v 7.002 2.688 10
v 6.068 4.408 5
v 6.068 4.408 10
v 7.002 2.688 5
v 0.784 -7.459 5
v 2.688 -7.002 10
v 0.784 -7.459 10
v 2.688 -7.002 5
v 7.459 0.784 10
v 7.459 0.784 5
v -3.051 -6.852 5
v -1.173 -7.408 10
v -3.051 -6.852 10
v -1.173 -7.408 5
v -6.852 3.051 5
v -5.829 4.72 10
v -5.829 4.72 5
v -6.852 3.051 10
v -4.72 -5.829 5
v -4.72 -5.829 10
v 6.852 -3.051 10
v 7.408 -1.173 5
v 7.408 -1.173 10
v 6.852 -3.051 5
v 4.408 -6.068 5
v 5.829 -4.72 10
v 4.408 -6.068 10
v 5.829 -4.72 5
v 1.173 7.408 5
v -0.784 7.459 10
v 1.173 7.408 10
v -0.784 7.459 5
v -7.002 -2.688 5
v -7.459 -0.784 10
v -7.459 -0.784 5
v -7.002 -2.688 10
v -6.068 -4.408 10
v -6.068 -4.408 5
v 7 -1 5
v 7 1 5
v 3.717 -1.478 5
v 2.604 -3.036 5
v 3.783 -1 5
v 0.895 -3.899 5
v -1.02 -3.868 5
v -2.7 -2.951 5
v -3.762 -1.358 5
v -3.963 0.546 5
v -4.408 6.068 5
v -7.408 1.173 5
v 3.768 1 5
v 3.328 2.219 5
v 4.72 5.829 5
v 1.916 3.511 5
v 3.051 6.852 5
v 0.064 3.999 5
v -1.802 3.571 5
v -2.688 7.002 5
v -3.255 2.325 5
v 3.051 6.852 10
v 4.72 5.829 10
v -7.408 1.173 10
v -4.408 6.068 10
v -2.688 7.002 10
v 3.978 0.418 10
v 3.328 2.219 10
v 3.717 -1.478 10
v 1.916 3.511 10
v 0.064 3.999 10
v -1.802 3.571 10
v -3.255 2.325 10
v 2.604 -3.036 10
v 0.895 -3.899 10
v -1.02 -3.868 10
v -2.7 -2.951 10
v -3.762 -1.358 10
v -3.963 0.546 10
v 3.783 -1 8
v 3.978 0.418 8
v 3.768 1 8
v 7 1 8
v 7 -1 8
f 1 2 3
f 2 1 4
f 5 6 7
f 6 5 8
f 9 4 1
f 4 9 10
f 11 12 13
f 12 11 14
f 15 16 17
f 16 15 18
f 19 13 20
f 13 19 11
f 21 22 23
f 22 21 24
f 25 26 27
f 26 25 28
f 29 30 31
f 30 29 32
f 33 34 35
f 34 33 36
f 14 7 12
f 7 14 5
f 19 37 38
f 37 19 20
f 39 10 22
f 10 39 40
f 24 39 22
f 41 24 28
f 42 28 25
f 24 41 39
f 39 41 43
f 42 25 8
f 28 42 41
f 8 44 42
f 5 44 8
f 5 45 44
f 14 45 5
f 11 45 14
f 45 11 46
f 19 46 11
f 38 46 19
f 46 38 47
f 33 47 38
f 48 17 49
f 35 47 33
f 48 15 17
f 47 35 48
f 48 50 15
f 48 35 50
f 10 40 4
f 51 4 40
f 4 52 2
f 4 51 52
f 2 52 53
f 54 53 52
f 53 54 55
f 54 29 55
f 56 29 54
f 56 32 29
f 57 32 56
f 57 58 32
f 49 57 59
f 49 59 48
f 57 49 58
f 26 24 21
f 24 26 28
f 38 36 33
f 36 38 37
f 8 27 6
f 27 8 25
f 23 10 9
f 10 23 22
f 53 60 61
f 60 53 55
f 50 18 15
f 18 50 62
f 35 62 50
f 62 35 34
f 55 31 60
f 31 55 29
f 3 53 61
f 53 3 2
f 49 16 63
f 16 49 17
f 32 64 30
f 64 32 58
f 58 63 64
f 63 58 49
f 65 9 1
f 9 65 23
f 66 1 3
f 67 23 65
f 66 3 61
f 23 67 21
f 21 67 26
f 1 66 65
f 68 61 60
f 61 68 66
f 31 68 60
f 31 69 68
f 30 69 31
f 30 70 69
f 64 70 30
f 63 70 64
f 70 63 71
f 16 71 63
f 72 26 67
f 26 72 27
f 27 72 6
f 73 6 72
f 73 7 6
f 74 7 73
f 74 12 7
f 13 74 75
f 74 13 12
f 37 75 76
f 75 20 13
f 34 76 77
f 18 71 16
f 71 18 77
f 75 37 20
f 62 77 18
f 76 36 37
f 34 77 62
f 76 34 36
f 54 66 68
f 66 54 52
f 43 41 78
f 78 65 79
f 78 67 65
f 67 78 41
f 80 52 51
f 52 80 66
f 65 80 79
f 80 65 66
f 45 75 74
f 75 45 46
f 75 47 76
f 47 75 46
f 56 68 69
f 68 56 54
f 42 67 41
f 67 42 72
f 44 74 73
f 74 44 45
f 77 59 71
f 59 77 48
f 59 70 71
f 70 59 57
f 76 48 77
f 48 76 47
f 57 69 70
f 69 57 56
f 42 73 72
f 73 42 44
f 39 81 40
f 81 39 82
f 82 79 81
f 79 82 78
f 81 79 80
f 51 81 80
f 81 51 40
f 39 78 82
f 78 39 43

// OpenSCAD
// file: ../robot_settings.scad
main_box_x = 95; // 96
main_box_y = 102;
main_box_z = 74; // 74.5
wall_thickness = 2;

rail_gap = 2;
rail_inset = 7;

rail_thickness = 7;
rail_length = 250;
rail_width = 200;

raspberry_pi_screw_seperation_y = 57;
raspberry_pi_screw_seperation_z = 48;
raspberry_pi_peg_h = 5;

battery_box_peg_h = 6;
battery_box_peg_d = 8;
battery_box_peg_cutout = 5;

gears_module = 1;
pinion_gear_teeth = 30;
pinion_gear_width = 5;
pinion_gear_bore = 4;

gears_setback_distance = 25;
gear_post_height = 2 * pinion_gear_width + rail_thickness + 8 ;

steering_motor_mount_x = 45;
steering_motor_mount_y = 36;
steering_motor_mount_z = 18;
steering_motor_mount_setback_distance = gears_setback_distance + 16;

dc_motor_drivertype = "Teyleten"; // Teyleten
isAdafruit = (dc_motor_drivertype == "Adafruit");

drv8871_x = isAdafruit ? 20.3 : 21.6;
drv8871_y = isAdafruit ?  24 : 25;

drv8871_z = 2;
drv8871_screw_d = 2.5;
drv8871_solder_points_z = 2;

drv8871mount_edge_x = 1.5;
drv8871mount_edge_wall = 3;
drv8871mount_z = 5;
drv8871mount_x = drv8871_x +  drv8871mount_edge_wall - 2* drv8871mount_edge_x;
drv8871mount_y = 19;

drv8871_screw_distance = 15.64;
drv8871_solder_points_d = 1.66;
drv8871_solder_offset_y = 4.4;
drv8871_solder_inner_points_distance = 5;
drv8871_solder_outer_points_distance = 12;

dc_motor_housing_minus_encoder_z = 48;
dc_motor_encoder_z = 9.33;
dc_motor_encoder_wheel_d = 13.4;
dc_motor_encoder_wheel_thickness = 5;
dc_motor_encoder_wheel_gap = 3;
dc_motor_encoder_circuit_thickness = 2;
dc_motor_cutout_d = 24.8;
dc_motor_cutout_z = 19.5;

dc_motor_screw_head_z = 2;
dc_motor_screw_head_d = 5.6;
dc_motor_screw_d = 3.2;
dc_motor_screw_offset = 8.5;

dc_motor_axle_ring_z = 3;
dc_motor_axle_ring_d = 7.2;
dc_motor_axle_cutout_d = 4.5;
dc_motor_axle_cutout_z = 10;
dc_motor_axle_notch_cutout = 0.4;
dc_motor_axle_notch_cutout_z = 6;

pdmount_x = 20;
pdmount_y = 30;
pdmount_z = 2;
pdmount_edge_x = 1.5;
pdmount_edge_wall = 3;

steering_shaft_z = 45;
steering_shaft_d = 7;
steering_shaft_motor_fitting_d = 9;
coupler_length = 24.6;
coupler_diameter = 14;
coupler_screw_d = 4;
coupler_screw_z_offset = 5;
coupler_gear_side_insert = 12.6;
steering_shaft_with_coupler_z = steering_shaft_z - coupler_gear_side_insert;

lidar_mount_y = 110;
lidar_mount_x = 65 + 20;
lidar_narrow_screws = 40;
lidar_wide_screws = 56;
lidar_front_to_back_screws = 70;
lidar_screw_d = 3;
lidar_circuitboard_x = 20;
lidar_circuitboard_y = 35;
lidar_circuitboard_z = 1.2;
lidar_cord_length = 29;

ball_bearing_height = 7;
ball_bearing_outer_diameter = 22;
ball_bearing_inner_diameter = 8;

 armature_holder_height = 20;
 armature_holder_thickness = 8;
pull_bar_peg_r = 3.2;
apparatus_locking_peg_d = 4;

rack_module = 1;
rack_length = main_box_x / 2;
rack_height = 10;
rack_width = 10;
rack_teeth = 30;
rack_bore = 3;

pull_bar_length = rail_width / 2 - rack_length + 1;

// tire hardware
axle_length = 30;
axle_reciever_inner_diameter = 7.75;
axle_reciever_length = 18.8;
axle_notch_length = 7;
axle_notch_cutout = 2.4;

// power distribution bar
power_bar_cutout_x = 96;
power_bar_y = 19.1;
power_bar_z = 1.5;
power_bar_screw_distance = 91.4;
power_bar_screw_d = 2.8;
power_bar_standoff_z = 5;
power_bar_standoff_d = 6.83;

// breadboard
breadboard_wall_thickness = 3;
breadboard_width = 55;
breadboard_length = 83;
breadboard_height = 10.5;
breadboard_notch_width = 4.2;
breadboard_longside_notch_separation = 58.2 - breadboard_notch_width / 2;
breadboard_shortside_notch_separation = 26.3 - breadboard_notch_width;

pico_expander_width = 63;
pico_expander_height = 57;
pico_screw_hole_offset = 3;
pico_screw_hole_d = 2.5;

usbhub_thickness = 11.7;
usbhub_depth = 37.5;
usbhub_width = 86.7;
usbhub_end_port_width = 14.8;
usbhub_end_port_height = 12;
usbhub_front_face_safe_zone_left = 15;
usbhub_front_face_safe_zone_right = 14.8;

switch_w = 16;
switch_cutout_d = 12.2;
switch_bump_h = 2;
switch_bump_l = 18.2;
// main file
include <../robot_settings.scad>
use <MCAD/involute_gears.scad>

module geared() {
      translate([0, 0, 0])
        difference() {
        rotate([0,0,6])
          gear(gear_thickness = pinion_gear_width,
               number_of_teeth = pinion_gear_teeth,
               circular_pitch = gears_module * PI * 1.1,
               bore_diameter = ball_bearing_inner_diameter,
               pressure_angle = 20,
               clearance = 0,
               backlash = .5);
          
          translate([0,-1,-2])
          cube([ball_bearing_inner_diameter - 1, 2, 10]);
        }
    }
    geared();
    
